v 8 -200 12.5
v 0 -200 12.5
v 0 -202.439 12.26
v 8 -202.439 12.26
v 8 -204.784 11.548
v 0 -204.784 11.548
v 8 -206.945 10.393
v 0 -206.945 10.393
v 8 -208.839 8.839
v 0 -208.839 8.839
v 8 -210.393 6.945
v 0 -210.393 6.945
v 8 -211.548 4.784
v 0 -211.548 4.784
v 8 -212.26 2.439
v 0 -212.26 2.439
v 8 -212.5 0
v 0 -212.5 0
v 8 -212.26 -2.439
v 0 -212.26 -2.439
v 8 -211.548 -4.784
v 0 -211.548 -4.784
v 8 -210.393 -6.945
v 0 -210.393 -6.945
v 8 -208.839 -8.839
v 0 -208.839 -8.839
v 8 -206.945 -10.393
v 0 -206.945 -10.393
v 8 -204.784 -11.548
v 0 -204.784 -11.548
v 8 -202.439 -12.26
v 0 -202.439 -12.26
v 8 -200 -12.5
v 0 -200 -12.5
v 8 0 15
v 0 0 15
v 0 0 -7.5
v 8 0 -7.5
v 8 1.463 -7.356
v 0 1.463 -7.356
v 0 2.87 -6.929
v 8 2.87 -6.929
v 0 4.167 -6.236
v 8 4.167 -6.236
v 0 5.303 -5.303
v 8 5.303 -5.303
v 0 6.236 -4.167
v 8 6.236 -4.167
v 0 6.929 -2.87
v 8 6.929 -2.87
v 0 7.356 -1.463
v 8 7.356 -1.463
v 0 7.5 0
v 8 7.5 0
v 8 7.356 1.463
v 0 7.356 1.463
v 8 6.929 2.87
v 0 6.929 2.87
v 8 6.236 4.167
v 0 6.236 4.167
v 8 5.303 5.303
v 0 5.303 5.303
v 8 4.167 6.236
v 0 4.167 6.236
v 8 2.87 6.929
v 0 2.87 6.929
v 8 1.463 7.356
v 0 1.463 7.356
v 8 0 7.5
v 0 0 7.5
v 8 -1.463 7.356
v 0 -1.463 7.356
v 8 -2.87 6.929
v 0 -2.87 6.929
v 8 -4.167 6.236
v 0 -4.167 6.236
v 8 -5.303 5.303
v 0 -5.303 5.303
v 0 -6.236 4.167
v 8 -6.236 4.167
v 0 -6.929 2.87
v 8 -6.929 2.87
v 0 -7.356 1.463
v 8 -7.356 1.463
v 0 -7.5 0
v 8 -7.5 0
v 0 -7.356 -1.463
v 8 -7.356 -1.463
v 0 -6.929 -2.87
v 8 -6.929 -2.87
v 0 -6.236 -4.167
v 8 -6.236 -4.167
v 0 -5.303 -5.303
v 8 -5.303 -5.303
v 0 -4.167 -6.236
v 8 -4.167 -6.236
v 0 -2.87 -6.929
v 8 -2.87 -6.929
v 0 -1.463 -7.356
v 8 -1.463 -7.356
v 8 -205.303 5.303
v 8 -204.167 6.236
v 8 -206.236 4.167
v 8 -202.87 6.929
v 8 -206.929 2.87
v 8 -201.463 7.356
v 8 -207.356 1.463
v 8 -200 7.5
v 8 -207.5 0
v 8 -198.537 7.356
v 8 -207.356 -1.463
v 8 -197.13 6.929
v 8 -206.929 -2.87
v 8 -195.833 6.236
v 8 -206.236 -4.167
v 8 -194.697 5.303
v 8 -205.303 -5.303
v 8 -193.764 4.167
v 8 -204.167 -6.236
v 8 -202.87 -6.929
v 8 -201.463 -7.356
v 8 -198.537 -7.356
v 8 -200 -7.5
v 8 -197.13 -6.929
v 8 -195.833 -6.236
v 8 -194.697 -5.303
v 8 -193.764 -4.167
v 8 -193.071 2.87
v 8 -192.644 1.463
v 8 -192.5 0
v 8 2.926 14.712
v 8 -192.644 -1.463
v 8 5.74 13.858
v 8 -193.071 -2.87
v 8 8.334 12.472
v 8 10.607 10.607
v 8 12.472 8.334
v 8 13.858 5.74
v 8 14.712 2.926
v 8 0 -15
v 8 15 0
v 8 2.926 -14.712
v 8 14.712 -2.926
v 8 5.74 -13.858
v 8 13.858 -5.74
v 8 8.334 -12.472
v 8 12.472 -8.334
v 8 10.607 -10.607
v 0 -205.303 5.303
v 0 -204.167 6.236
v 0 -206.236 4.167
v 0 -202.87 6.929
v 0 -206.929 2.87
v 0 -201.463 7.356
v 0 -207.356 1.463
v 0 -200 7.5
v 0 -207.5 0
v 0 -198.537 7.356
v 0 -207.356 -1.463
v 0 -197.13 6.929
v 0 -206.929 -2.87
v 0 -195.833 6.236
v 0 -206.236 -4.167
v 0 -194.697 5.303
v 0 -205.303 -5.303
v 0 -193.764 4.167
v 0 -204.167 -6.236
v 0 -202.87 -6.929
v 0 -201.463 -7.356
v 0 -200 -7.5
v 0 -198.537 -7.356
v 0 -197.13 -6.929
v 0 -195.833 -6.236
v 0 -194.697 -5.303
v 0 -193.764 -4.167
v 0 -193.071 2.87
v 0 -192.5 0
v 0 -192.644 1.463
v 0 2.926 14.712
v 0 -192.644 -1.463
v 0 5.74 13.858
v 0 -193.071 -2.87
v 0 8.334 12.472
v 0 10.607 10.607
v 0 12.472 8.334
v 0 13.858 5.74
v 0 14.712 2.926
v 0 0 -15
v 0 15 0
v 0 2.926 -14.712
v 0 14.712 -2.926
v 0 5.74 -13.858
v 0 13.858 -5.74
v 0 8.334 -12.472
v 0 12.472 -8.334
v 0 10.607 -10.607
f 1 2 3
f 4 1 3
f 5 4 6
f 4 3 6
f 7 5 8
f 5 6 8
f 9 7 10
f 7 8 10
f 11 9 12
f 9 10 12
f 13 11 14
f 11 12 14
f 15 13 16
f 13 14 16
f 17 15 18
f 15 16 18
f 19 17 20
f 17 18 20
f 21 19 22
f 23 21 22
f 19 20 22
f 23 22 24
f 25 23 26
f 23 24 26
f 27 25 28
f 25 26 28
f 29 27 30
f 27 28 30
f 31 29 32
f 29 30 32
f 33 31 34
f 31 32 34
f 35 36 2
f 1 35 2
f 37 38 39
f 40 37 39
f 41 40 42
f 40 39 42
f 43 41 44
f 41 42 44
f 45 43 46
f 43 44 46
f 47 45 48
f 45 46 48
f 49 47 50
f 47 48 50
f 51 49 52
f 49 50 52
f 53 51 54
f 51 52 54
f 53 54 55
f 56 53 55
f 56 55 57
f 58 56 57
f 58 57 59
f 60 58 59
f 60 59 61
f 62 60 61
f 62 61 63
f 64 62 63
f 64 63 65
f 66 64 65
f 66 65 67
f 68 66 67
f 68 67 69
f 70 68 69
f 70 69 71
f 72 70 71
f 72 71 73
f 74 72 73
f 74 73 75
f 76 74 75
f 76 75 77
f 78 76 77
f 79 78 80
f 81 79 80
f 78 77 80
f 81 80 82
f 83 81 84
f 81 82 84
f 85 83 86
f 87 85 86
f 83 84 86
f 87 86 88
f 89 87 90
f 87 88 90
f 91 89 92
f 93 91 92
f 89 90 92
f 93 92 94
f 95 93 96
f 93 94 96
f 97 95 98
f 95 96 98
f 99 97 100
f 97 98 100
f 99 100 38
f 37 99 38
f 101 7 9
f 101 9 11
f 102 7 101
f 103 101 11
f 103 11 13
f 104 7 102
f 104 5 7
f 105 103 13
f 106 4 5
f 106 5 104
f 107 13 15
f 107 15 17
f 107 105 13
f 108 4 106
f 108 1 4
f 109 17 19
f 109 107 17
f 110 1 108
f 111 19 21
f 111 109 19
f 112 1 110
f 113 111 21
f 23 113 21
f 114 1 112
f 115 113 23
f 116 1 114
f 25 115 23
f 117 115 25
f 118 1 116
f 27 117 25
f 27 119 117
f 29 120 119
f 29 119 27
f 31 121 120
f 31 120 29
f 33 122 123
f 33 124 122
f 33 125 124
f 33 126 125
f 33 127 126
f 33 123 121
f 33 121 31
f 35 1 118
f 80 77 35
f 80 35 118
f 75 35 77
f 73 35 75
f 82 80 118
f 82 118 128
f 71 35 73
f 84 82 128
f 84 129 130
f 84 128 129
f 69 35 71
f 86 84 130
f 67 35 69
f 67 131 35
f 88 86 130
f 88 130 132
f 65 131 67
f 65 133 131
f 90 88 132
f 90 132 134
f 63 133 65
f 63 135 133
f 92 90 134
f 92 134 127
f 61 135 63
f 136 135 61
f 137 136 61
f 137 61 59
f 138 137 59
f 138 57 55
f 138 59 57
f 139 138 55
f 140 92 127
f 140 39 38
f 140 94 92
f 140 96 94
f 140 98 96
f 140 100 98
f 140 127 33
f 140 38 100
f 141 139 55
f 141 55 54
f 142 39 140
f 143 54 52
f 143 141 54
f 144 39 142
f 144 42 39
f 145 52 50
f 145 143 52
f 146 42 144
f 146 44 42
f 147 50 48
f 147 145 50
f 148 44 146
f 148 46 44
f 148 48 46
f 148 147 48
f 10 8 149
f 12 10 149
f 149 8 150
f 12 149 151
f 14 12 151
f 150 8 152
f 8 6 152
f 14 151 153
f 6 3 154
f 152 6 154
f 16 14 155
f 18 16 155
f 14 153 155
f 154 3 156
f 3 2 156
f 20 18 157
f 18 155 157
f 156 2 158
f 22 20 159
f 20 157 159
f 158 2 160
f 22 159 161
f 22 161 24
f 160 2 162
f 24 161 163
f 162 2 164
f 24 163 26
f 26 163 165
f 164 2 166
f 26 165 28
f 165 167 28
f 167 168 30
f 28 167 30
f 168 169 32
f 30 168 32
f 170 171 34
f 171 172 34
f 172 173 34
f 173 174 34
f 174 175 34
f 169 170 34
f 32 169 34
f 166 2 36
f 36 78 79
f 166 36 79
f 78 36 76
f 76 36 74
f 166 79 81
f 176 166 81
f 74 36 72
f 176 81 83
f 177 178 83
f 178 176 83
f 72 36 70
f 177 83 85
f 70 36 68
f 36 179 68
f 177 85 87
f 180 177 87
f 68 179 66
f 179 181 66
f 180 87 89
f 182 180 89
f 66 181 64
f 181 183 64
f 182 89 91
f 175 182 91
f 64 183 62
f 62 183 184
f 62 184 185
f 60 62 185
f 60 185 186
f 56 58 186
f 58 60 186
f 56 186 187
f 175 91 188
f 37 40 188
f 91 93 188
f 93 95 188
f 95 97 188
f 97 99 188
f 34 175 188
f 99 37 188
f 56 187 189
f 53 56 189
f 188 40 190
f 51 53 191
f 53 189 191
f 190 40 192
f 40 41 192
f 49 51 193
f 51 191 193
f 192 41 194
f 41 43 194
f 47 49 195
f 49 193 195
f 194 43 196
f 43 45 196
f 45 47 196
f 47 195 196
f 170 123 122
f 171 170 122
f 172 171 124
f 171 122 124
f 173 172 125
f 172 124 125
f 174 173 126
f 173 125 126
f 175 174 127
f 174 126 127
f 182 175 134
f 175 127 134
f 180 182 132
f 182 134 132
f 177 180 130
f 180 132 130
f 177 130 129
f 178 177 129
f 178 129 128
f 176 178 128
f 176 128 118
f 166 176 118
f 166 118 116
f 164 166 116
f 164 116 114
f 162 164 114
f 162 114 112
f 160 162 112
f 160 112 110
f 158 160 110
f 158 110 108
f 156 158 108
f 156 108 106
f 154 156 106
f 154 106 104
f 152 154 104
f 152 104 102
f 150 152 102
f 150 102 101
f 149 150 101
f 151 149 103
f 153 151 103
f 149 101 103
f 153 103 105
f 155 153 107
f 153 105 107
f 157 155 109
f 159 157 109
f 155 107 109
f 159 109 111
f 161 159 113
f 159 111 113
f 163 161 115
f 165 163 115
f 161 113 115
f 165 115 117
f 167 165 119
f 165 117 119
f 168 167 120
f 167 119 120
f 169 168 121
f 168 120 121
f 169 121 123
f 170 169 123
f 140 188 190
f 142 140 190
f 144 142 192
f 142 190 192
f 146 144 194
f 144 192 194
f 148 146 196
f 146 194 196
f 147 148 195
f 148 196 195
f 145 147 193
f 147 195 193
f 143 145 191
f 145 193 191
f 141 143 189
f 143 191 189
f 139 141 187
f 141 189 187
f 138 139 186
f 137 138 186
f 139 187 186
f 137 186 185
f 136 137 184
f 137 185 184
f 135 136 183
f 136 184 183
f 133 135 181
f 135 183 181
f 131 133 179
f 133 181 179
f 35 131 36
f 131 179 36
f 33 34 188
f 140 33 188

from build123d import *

# Parameters (mm, degrees)
EXTRUDE_1_DEPTH     = 8
SKETCH_2_R          = 7.5
CUT_EXTRUDE_1_DEPTH = 10


with BuildPart() as part:
    # 草图1 → 凸台-拉伸1 (new body)
    with BuildSketch(Plane(origin=(0, 0, 0), x_dir=(0, 0, -1), z_dir=(1, 0, 0))):
        with BuildLine():
            ThreePointArc((15, 0), (0, 15), (-15, 0))
            Line((-15, 0), (-12.5, -200))
            ThreePointArc((-12.5, -200), (0, -212.5), (12.5, -200))
            Line((12.5, -200), (15, 0))
        make_face()
    extrude(amount=EXTRUDE_1_DEPTH)

    # 草图2 → 切除-拉伸1 (cut)
    with BuildSketch(Plane(origin=(8, 0, 0), x_dir=(0, 0, -1), z_dir=(1, 0, 0))):
        Circle(SKETCH_2_R)
        with Locations((0, -200)):
            Circle(SKETCH_2_R)
    extrude(amount=-CUT_EXTRUDE_1_DEPTH, mode=Mode.SUBTRACT)


solid = part.part
